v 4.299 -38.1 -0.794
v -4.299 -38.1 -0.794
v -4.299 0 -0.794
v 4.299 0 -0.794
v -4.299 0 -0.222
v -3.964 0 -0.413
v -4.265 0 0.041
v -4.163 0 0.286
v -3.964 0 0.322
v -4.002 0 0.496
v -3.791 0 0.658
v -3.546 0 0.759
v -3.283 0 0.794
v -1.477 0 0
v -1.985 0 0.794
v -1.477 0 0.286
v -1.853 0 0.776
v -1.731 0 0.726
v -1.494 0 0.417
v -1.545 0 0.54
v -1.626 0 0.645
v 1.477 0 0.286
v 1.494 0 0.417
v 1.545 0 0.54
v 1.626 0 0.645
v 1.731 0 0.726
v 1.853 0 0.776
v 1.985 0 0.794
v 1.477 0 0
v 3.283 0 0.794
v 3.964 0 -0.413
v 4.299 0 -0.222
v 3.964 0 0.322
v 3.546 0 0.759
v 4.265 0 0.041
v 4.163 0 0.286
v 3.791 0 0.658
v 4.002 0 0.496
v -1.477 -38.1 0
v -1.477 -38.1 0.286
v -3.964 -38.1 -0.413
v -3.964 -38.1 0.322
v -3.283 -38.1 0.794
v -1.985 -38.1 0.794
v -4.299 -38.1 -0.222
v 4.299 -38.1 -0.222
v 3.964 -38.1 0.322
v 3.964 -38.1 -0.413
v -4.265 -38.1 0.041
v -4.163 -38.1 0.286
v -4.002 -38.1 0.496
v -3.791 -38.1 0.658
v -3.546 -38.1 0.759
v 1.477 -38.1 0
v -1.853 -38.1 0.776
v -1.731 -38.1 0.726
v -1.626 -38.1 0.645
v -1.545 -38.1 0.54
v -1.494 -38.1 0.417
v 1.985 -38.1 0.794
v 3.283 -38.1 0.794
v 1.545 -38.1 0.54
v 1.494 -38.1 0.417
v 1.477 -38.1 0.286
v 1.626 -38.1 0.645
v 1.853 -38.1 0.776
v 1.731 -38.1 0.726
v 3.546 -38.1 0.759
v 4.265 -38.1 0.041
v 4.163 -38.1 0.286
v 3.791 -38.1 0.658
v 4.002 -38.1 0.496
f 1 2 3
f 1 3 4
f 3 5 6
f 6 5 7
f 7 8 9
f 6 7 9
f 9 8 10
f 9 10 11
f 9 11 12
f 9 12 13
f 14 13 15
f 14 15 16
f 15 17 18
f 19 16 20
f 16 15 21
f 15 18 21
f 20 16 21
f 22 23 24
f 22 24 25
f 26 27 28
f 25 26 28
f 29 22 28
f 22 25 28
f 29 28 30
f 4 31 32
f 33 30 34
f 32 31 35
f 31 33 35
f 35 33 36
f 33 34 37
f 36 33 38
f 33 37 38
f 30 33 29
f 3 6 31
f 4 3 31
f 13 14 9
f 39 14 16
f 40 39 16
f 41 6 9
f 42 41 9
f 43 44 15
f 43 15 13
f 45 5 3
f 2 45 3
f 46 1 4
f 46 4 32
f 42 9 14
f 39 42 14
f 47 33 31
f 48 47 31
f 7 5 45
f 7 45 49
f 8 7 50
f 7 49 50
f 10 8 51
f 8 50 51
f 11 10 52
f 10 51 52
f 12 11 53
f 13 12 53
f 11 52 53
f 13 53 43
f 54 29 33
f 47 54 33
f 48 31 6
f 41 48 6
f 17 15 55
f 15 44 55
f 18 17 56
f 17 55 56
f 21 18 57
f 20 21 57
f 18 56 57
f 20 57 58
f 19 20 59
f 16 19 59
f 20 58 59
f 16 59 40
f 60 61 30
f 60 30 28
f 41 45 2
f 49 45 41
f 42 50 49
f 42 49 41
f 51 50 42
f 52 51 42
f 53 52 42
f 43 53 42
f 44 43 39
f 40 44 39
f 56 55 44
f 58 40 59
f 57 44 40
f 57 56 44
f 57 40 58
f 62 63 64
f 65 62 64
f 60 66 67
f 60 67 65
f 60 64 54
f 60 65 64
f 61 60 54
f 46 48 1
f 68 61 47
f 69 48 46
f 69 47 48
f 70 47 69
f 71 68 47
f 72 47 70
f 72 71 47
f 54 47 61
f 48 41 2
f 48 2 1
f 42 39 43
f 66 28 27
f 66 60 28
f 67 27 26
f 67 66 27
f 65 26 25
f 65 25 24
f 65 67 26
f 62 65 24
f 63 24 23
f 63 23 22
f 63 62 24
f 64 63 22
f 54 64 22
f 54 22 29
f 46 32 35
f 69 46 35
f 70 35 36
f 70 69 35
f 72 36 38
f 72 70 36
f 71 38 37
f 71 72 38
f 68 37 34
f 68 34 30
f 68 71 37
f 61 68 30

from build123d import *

# Parameters (mm, degrees)
F1_DEPTH = 38.1
F2_R     = 1.016
F3_R     = 1.016
F4_R     = 0.508
F5_R     = 0.508


with BuildPart() as f1:
    # F0 (on Front) → F1 (new body)
    with BuildSketch(Plane.XZ):
        Polygon((-4.299126, 0.79375), (-4.299126, -0.79375), (4.299126, -0.79375), (4.299126, 0.79375), (1.476904, 0.79375), (1.476904, 0), (3.964072, 0.321753), (3.964072, -0.412909), (-3.964072, -0.412909), (-3.964072, 0.321753), (-1.476904, 0), (-1.476904, 0.79375), align=None)
    extrude(amount=F1_DEPTH)

    # F2
    f2_edges = [f1.edges().sort_by_distance(p)[0] for p in [
        (-4.299126, -19.05, 0.79375),
    ]]
    fillet(f2_edges, radius=F2_R)

    # F3
    f3_edges = [f1.edges().sort_by_distance(p)[0] for p in [
        (4.299126, -19.05, 0.79375),
    ]]
    fillet(f3_edges, radius=F3_R)

    # F4
    f4_edges = [f1.edges().sort_by_distance(p)[0] for p in [
        (-1.476904, -19.05, 0.79375),
    ]]
    fillet(f4_edges, radius=F4_R)

    # F5
    f5_edges = [f1.edges().sort_by_distance(p)[0] for p in [
        (1.476904, -19.05, 0.79375),
    ]]
    fillet(f5_edges, radius=F5_R)


solid = f1.part
